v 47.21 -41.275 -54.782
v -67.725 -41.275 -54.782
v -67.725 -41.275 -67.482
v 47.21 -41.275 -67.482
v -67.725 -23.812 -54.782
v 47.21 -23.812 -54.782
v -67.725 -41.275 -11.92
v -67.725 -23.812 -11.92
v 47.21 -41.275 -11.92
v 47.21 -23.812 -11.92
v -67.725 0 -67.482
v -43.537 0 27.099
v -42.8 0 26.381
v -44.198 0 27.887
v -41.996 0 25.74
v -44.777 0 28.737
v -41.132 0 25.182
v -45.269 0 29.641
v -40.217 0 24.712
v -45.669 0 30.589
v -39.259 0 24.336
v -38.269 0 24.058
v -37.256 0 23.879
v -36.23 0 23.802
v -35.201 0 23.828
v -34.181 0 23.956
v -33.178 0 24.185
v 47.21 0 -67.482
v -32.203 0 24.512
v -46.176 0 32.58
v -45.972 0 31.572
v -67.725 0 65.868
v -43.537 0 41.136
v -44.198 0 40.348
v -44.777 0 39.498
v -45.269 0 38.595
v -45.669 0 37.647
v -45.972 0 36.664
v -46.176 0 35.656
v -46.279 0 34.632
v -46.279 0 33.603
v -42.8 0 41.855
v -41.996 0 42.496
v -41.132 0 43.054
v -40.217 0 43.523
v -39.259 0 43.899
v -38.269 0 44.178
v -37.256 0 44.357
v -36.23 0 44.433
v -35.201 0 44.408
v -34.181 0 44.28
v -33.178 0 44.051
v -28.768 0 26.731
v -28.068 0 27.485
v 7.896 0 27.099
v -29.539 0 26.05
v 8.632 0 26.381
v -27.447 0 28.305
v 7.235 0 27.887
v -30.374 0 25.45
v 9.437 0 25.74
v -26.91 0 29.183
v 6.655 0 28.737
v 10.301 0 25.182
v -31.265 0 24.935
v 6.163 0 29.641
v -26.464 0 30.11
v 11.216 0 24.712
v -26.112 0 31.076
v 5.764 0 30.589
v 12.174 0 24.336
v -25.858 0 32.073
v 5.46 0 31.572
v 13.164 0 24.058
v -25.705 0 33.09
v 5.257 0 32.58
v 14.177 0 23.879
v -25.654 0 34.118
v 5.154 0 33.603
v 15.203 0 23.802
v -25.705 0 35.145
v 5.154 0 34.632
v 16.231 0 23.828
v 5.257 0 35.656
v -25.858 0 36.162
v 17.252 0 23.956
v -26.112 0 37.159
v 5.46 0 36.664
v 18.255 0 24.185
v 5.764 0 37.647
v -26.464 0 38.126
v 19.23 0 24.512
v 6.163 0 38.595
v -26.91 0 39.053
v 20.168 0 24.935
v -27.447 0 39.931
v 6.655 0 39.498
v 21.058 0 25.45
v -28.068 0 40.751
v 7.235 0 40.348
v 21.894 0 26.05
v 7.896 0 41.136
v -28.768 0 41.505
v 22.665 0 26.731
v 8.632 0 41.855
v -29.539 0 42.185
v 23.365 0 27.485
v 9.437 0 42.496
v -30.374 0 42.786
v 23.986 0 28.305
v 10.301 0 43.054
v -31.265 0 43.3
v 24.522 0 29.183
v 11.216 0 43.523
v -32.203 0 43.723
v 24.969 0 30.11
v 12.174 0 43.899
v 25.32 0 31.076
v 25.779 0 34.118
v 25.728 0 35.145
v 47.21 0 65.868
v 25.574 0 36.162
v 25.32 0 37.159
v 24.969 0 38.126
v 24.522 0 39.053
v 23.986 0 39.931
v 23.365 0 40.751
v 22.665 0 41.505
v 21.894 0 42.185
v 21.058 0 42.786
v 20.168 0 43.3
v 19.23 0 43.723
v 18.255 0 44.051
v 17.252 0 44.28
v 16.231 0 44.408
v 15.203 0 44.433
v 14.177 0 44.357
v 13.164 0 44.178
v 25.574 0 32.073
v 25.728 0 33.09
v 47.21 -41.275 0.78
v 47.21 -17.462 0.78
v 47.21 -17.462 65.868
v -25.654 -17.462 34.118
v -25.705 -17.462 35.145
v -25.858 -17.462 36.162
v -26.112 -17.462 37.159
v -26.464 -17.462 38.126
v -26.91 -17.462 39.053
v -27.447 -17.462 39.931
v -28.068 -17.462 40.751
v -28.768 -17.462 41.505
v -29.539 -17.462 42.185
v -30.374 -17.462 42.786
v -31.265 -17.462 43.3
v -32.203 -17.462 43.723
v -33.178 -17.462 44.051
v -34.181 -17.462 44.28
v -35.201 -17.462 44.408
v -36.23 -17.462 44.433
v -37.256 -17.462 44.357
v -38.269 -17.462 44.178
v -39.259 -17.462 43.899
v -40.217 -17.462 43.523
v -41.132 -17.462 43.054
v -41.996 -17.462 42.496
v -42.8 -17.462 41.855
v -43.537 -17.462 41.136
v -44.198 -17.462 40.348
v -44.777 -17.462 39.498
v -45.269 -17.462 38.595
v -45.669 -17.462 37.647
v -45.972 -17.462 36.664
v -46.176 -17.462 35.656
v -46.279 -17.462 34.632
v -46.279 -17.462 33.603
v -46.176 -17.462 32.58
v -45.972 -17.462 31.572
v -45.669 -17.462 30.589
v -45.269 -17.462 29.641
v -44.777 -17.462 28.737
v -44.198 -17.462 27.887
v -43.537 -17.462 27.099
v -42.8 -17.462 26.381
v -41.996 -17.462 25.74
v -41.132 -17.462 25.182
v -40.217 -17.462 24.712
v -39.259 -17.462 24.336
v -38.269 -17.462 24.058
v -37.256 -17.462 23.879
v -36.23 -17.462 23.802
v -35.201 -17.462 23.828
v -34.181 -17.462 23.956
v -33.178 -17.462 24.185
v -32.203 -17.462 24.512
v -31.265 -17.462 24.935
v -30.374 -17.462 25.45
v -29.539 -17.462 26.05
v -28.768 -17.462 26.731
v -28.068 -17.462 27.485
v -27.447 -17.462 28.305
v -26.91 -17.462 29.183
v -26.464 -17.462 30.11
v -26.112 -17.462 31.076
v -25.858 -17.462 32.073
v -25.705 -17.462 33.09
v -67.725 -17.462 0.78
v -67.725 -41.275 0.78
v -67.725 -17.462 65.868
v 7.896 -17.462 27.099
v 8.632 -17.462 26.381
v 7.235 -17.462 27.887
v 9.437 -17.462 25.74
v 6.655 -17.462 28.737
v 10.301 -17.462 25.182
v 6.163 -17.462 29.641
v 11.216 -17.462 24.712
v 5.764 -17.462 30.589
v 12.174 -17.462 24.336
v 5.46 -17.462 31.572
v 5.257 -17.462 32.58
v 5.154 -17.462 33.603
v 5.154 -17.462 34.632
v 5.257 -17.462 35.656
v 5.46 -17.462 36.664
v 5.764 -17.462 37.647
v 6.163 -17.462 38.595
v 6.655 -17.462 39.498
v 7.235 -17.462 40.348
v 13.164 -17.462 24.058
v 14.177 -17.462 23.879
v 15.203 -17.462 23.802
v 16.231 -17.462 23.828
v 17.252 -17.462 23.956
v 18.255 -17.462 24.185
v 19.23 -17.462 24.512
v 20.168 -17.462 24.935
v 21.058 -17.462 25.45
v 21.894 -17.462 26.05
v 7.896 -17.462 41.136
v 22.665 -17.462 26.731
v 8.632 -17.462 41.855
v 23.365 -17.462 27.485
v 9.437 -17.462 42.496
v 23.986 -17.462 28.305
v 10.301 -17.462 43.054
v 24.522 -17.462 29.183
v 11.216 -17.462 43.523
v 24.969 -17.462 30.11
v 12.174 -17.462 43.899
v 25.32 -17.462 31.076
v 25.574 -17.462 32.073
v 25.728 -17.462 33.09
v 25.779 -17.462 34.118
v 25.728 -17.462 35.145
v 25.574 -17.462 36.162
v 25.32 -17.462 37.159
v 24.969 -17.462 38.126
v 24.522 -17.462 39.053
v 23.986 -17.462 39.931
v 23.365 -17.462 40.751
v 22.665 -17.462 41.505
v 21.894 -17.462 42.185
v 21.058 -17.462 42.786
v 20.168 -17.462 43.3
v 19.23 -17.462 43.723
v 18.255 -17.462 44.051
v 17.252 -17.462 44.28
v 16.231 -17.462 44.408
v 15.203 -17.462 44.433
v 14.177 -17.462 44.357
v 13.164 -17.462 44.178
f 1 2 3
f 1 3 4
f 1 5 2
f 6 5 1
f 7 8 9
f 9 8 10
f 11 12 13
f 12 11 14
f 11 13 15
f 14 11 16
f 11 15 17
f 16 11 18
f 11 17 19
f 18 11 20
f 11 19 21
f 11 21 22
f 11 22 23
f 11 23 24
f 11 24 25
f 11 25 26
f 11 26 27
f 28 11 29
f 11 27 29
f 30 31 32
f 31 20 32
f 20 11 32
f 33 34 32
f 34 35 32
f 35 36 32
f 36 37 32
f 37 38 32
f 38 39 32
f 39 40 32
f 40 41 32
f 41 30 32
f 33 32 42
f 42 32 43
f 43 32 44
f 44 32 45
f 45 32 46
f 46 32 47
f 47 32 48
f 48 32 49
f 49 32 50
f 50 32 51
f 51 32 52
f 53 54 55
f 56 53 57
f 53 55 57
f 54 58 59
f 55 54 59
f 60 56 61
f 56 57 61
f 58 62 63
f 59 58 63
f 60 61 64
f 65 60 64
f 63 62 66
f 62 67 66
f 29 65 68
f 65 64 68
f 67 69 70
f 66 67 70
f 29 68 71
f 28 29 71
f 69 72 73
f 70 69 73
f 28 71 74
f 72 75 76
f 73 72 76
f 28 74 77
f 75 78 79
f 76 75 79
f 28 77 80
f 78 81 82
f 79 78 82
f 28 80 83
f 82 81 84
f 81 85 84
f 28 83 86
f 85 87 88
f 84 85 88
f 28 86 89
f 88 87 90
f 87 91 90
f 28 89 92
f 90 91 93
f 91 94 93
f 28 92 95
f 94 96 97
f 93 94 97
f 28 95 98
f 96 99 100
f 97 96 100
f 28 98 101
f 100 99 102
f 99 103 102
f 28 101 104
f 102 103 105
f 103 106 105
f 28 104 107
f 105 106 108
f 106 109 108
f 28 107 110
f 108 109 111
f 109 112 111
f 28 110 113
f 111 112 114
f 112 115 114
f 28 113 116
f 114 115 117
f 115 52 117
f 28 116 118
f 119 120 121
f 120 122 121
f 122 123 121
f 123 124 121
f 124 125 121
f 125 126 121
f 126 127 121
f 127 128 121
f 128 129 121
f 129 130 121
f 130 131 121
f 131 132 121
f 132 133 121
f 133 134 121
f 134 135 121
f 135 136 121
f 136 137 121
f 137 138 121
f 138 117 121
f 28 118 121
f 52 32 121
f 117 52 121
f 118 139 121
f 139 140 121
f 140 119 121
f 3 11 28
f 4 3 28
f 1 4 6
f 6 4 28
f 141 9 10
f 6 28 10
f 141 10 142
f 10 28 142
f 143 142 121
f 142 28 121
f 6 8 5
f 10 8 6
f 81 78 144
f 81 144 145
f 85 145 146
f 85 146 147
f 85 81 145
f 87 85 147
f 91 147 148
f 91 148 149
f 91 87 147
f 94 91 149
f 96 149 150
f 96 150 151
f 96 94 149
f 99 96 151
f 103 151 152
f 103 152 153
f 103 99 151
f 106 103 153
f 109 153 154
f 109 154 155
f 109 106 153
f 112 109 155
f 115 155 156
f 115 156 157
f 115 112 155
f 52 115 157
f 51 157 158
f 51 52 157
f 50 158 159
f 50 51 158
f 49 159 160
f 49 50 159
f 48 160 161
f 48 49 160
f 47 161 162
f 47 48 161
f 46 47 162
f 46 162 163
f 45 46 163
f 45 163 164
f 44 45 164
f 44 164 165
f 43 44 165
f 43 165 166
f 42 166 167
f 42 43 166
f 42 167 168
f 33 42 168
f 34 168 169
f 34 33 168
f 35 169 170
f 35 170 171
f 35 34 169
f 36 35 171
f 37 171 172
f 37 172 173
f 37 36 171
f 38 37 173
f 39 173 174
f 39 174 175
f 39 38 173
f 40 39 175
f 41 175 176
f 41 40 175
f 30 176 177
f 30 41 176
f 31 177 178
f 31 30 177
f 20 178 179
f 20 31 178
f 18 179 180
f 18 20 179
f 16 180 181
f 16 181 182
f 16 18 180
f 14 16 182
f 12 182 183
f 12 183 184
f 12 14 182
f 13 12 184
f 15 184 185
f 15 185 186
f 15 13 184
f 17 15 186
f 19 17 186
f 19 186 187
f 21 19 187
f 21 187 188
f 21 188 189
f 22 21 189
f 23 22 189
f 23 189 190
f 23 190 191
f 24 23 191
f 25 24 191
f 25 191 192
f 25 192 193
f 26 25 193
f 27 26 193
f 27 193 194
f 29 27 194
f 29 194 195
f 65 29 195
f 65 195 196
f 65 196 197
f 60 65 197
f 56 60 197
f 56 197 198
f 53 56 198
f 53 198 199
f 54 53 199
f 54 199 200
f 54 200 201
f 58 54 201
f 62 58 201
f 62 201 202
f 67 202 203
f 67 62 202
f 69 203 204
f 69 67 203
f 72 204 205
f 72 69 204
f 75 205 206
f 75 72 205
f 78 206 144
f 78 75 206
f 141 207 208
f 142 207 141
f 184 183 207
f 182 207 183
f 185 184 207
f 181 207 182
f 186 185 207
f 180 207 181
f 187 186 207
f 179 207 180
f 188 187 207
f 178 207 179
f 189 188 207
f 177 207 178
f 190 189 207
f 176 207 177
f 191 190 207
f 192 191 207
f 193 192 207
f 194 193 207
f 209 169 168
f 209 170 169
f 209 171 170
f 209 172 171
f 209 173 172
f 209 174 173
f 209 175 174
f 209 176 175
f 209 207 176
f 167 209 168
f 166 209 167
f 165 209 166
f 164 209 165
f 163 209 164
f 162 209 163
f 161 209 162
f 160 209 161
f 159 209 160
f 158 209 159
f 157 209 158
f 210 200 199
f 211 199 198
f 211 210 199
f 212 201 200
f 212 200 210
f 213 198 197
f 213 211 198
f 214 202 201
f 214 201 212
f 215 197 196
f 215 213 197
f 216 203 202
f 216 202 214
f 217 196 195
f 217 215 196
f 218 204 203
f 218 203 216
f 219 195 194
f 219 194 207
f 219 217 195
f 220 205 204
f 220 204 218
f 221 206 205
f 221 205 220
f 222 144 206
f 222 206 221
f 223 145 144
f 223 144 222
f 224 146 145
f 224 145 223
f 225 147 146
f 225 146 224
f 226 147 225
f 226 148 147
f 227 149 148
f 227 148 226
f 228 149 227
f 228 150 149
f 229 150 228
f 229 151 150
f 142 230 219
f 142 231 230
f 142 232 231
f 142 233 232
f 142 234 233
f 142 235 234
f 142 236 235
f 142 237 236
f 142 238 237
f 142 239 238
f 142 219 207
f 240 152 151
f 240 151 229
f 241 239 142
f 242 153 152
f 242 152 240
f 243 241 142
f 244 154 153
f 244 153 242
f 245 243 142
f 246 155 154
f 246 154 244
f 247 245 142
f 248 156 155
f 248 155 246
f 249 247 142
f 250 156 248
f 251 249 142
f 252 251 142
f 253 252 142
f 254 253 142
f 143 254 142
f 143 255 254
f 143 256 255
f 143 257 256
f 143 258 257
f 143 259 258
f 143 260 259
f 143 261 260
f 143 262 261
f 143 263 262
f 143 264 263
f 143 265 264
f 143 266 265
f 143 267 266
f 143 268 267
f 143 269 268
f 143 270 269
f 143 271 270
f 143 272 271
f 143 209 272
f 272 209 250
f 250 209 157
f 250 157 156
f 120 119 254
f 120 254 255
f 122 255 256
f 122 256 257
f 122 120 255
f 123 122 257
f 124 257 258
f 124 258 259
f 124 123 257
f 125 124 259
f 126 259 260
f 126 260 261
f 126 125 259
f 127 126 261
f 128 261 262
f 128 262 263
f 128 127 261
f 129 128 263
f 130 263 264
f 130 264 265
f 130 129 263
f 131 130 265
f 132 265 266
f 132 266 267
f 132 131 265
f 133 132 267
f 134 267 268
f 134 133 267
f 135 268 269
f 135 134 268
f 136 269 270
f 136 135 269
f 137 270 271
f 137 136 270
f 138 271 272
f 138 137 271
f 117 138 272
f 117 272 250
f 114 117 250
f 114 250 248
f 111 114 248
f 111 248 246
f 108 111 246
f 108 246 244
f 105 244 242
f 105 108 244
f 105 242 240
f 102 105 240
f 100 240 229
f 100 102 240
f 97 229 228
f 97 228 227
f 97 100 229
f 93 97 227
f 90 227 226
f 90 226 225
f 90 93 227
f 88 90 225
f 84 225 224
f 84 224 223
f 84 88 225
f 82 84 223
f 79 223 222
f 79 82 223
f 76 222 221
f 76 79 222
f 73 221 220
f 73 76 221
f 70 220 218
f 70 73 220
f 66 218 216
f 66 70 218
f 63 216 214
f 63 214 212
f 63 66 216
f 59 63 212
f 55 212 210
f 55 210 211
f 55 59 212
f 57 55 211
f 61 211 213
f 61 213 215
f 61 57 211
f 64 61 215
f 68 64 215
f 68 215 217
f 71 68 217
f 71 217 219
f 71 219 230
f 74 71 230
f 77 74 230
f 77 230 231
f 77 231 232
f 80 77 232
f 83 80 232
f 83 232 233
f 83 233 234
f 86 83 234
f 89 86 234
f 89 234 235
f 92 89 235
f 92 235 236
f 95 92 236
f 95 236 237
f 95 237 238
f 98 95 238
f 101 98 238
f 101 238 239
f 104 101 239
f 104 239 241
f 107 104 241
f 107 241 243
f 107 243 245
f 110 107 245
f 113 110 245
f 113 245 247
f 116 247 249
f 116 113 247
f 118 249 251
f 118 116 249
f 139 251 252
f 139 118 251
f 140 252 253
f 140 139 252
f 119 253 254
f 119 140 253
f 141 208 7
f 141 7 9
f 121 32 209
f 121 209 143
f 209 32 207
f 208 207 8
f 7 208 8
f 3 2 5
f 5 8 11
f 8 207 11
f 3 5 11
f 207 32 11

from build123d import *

# Parameters (mm, degrees)
F0_W     = 114.935
F0_H     = 65.0875
F0_R     = 10.31875
F0_H_2   = 12.7
F0_H_3   = 42.8625
F1_DEPTH = 17.4625
F2_DEPTH = 23.8125
F3_DEPTH = 41.275


with BuildPart() as f1:
    # F0 (on Front) → F1 (new body)
    with BuildSketch(Plane.XZ):
        with Locations((-10.257453, 33.324088)):
            Rectangle(F0_W, F0_H)
        with Locations((-35.972588, 34.117838)):
            Circle(F0_R, mode=Mode.SUBTRACT)
        with Locations((15.460047, 34.117838)):
            Circle(F0_R, mode=Mode.SUBTRACT)
        with Locations((-10.257453, -5.569662)):
            Rectangle(F0_W, F0_H_2)
        with Locations((-10.257453, -33.350912)):
            Rectangle(F0_W, F0_H_3)
        with Locations((-10.257453, -61.132162)):
            Rectangle(F0_W, F0_H_2)
    extrude(amount=F1_DEPTH)

    # F0 (on Front) → F2 (join)
    with BuildSketch(Plane.XZ):
        with Locations((-10.257453, -61.132162)):
            Rectangle(F0_W, F0_H_2)
        with Locations((-10.257453, -33.350912)):
            Rectangle(F0_W, F0_H_3)
        with Locations((-10.257453, -5.569662)):
            Rectangle(F0_W, F0_H_2)
    extrude(amount=F2_DEPTH)

    # F0 (on Front) → F3 (join)
    with BuildSketch(Plane.XZ):
        with Locations((-10.257453, -5.569662)):
            Rectangle(F0_W, F0_H_2)
        with Locations((-10.257453, -61.132162)):
            Rectangle(F0_W, F0_H_2)
    extrude(amount=F3_DEPTH)


solid = f1.part
